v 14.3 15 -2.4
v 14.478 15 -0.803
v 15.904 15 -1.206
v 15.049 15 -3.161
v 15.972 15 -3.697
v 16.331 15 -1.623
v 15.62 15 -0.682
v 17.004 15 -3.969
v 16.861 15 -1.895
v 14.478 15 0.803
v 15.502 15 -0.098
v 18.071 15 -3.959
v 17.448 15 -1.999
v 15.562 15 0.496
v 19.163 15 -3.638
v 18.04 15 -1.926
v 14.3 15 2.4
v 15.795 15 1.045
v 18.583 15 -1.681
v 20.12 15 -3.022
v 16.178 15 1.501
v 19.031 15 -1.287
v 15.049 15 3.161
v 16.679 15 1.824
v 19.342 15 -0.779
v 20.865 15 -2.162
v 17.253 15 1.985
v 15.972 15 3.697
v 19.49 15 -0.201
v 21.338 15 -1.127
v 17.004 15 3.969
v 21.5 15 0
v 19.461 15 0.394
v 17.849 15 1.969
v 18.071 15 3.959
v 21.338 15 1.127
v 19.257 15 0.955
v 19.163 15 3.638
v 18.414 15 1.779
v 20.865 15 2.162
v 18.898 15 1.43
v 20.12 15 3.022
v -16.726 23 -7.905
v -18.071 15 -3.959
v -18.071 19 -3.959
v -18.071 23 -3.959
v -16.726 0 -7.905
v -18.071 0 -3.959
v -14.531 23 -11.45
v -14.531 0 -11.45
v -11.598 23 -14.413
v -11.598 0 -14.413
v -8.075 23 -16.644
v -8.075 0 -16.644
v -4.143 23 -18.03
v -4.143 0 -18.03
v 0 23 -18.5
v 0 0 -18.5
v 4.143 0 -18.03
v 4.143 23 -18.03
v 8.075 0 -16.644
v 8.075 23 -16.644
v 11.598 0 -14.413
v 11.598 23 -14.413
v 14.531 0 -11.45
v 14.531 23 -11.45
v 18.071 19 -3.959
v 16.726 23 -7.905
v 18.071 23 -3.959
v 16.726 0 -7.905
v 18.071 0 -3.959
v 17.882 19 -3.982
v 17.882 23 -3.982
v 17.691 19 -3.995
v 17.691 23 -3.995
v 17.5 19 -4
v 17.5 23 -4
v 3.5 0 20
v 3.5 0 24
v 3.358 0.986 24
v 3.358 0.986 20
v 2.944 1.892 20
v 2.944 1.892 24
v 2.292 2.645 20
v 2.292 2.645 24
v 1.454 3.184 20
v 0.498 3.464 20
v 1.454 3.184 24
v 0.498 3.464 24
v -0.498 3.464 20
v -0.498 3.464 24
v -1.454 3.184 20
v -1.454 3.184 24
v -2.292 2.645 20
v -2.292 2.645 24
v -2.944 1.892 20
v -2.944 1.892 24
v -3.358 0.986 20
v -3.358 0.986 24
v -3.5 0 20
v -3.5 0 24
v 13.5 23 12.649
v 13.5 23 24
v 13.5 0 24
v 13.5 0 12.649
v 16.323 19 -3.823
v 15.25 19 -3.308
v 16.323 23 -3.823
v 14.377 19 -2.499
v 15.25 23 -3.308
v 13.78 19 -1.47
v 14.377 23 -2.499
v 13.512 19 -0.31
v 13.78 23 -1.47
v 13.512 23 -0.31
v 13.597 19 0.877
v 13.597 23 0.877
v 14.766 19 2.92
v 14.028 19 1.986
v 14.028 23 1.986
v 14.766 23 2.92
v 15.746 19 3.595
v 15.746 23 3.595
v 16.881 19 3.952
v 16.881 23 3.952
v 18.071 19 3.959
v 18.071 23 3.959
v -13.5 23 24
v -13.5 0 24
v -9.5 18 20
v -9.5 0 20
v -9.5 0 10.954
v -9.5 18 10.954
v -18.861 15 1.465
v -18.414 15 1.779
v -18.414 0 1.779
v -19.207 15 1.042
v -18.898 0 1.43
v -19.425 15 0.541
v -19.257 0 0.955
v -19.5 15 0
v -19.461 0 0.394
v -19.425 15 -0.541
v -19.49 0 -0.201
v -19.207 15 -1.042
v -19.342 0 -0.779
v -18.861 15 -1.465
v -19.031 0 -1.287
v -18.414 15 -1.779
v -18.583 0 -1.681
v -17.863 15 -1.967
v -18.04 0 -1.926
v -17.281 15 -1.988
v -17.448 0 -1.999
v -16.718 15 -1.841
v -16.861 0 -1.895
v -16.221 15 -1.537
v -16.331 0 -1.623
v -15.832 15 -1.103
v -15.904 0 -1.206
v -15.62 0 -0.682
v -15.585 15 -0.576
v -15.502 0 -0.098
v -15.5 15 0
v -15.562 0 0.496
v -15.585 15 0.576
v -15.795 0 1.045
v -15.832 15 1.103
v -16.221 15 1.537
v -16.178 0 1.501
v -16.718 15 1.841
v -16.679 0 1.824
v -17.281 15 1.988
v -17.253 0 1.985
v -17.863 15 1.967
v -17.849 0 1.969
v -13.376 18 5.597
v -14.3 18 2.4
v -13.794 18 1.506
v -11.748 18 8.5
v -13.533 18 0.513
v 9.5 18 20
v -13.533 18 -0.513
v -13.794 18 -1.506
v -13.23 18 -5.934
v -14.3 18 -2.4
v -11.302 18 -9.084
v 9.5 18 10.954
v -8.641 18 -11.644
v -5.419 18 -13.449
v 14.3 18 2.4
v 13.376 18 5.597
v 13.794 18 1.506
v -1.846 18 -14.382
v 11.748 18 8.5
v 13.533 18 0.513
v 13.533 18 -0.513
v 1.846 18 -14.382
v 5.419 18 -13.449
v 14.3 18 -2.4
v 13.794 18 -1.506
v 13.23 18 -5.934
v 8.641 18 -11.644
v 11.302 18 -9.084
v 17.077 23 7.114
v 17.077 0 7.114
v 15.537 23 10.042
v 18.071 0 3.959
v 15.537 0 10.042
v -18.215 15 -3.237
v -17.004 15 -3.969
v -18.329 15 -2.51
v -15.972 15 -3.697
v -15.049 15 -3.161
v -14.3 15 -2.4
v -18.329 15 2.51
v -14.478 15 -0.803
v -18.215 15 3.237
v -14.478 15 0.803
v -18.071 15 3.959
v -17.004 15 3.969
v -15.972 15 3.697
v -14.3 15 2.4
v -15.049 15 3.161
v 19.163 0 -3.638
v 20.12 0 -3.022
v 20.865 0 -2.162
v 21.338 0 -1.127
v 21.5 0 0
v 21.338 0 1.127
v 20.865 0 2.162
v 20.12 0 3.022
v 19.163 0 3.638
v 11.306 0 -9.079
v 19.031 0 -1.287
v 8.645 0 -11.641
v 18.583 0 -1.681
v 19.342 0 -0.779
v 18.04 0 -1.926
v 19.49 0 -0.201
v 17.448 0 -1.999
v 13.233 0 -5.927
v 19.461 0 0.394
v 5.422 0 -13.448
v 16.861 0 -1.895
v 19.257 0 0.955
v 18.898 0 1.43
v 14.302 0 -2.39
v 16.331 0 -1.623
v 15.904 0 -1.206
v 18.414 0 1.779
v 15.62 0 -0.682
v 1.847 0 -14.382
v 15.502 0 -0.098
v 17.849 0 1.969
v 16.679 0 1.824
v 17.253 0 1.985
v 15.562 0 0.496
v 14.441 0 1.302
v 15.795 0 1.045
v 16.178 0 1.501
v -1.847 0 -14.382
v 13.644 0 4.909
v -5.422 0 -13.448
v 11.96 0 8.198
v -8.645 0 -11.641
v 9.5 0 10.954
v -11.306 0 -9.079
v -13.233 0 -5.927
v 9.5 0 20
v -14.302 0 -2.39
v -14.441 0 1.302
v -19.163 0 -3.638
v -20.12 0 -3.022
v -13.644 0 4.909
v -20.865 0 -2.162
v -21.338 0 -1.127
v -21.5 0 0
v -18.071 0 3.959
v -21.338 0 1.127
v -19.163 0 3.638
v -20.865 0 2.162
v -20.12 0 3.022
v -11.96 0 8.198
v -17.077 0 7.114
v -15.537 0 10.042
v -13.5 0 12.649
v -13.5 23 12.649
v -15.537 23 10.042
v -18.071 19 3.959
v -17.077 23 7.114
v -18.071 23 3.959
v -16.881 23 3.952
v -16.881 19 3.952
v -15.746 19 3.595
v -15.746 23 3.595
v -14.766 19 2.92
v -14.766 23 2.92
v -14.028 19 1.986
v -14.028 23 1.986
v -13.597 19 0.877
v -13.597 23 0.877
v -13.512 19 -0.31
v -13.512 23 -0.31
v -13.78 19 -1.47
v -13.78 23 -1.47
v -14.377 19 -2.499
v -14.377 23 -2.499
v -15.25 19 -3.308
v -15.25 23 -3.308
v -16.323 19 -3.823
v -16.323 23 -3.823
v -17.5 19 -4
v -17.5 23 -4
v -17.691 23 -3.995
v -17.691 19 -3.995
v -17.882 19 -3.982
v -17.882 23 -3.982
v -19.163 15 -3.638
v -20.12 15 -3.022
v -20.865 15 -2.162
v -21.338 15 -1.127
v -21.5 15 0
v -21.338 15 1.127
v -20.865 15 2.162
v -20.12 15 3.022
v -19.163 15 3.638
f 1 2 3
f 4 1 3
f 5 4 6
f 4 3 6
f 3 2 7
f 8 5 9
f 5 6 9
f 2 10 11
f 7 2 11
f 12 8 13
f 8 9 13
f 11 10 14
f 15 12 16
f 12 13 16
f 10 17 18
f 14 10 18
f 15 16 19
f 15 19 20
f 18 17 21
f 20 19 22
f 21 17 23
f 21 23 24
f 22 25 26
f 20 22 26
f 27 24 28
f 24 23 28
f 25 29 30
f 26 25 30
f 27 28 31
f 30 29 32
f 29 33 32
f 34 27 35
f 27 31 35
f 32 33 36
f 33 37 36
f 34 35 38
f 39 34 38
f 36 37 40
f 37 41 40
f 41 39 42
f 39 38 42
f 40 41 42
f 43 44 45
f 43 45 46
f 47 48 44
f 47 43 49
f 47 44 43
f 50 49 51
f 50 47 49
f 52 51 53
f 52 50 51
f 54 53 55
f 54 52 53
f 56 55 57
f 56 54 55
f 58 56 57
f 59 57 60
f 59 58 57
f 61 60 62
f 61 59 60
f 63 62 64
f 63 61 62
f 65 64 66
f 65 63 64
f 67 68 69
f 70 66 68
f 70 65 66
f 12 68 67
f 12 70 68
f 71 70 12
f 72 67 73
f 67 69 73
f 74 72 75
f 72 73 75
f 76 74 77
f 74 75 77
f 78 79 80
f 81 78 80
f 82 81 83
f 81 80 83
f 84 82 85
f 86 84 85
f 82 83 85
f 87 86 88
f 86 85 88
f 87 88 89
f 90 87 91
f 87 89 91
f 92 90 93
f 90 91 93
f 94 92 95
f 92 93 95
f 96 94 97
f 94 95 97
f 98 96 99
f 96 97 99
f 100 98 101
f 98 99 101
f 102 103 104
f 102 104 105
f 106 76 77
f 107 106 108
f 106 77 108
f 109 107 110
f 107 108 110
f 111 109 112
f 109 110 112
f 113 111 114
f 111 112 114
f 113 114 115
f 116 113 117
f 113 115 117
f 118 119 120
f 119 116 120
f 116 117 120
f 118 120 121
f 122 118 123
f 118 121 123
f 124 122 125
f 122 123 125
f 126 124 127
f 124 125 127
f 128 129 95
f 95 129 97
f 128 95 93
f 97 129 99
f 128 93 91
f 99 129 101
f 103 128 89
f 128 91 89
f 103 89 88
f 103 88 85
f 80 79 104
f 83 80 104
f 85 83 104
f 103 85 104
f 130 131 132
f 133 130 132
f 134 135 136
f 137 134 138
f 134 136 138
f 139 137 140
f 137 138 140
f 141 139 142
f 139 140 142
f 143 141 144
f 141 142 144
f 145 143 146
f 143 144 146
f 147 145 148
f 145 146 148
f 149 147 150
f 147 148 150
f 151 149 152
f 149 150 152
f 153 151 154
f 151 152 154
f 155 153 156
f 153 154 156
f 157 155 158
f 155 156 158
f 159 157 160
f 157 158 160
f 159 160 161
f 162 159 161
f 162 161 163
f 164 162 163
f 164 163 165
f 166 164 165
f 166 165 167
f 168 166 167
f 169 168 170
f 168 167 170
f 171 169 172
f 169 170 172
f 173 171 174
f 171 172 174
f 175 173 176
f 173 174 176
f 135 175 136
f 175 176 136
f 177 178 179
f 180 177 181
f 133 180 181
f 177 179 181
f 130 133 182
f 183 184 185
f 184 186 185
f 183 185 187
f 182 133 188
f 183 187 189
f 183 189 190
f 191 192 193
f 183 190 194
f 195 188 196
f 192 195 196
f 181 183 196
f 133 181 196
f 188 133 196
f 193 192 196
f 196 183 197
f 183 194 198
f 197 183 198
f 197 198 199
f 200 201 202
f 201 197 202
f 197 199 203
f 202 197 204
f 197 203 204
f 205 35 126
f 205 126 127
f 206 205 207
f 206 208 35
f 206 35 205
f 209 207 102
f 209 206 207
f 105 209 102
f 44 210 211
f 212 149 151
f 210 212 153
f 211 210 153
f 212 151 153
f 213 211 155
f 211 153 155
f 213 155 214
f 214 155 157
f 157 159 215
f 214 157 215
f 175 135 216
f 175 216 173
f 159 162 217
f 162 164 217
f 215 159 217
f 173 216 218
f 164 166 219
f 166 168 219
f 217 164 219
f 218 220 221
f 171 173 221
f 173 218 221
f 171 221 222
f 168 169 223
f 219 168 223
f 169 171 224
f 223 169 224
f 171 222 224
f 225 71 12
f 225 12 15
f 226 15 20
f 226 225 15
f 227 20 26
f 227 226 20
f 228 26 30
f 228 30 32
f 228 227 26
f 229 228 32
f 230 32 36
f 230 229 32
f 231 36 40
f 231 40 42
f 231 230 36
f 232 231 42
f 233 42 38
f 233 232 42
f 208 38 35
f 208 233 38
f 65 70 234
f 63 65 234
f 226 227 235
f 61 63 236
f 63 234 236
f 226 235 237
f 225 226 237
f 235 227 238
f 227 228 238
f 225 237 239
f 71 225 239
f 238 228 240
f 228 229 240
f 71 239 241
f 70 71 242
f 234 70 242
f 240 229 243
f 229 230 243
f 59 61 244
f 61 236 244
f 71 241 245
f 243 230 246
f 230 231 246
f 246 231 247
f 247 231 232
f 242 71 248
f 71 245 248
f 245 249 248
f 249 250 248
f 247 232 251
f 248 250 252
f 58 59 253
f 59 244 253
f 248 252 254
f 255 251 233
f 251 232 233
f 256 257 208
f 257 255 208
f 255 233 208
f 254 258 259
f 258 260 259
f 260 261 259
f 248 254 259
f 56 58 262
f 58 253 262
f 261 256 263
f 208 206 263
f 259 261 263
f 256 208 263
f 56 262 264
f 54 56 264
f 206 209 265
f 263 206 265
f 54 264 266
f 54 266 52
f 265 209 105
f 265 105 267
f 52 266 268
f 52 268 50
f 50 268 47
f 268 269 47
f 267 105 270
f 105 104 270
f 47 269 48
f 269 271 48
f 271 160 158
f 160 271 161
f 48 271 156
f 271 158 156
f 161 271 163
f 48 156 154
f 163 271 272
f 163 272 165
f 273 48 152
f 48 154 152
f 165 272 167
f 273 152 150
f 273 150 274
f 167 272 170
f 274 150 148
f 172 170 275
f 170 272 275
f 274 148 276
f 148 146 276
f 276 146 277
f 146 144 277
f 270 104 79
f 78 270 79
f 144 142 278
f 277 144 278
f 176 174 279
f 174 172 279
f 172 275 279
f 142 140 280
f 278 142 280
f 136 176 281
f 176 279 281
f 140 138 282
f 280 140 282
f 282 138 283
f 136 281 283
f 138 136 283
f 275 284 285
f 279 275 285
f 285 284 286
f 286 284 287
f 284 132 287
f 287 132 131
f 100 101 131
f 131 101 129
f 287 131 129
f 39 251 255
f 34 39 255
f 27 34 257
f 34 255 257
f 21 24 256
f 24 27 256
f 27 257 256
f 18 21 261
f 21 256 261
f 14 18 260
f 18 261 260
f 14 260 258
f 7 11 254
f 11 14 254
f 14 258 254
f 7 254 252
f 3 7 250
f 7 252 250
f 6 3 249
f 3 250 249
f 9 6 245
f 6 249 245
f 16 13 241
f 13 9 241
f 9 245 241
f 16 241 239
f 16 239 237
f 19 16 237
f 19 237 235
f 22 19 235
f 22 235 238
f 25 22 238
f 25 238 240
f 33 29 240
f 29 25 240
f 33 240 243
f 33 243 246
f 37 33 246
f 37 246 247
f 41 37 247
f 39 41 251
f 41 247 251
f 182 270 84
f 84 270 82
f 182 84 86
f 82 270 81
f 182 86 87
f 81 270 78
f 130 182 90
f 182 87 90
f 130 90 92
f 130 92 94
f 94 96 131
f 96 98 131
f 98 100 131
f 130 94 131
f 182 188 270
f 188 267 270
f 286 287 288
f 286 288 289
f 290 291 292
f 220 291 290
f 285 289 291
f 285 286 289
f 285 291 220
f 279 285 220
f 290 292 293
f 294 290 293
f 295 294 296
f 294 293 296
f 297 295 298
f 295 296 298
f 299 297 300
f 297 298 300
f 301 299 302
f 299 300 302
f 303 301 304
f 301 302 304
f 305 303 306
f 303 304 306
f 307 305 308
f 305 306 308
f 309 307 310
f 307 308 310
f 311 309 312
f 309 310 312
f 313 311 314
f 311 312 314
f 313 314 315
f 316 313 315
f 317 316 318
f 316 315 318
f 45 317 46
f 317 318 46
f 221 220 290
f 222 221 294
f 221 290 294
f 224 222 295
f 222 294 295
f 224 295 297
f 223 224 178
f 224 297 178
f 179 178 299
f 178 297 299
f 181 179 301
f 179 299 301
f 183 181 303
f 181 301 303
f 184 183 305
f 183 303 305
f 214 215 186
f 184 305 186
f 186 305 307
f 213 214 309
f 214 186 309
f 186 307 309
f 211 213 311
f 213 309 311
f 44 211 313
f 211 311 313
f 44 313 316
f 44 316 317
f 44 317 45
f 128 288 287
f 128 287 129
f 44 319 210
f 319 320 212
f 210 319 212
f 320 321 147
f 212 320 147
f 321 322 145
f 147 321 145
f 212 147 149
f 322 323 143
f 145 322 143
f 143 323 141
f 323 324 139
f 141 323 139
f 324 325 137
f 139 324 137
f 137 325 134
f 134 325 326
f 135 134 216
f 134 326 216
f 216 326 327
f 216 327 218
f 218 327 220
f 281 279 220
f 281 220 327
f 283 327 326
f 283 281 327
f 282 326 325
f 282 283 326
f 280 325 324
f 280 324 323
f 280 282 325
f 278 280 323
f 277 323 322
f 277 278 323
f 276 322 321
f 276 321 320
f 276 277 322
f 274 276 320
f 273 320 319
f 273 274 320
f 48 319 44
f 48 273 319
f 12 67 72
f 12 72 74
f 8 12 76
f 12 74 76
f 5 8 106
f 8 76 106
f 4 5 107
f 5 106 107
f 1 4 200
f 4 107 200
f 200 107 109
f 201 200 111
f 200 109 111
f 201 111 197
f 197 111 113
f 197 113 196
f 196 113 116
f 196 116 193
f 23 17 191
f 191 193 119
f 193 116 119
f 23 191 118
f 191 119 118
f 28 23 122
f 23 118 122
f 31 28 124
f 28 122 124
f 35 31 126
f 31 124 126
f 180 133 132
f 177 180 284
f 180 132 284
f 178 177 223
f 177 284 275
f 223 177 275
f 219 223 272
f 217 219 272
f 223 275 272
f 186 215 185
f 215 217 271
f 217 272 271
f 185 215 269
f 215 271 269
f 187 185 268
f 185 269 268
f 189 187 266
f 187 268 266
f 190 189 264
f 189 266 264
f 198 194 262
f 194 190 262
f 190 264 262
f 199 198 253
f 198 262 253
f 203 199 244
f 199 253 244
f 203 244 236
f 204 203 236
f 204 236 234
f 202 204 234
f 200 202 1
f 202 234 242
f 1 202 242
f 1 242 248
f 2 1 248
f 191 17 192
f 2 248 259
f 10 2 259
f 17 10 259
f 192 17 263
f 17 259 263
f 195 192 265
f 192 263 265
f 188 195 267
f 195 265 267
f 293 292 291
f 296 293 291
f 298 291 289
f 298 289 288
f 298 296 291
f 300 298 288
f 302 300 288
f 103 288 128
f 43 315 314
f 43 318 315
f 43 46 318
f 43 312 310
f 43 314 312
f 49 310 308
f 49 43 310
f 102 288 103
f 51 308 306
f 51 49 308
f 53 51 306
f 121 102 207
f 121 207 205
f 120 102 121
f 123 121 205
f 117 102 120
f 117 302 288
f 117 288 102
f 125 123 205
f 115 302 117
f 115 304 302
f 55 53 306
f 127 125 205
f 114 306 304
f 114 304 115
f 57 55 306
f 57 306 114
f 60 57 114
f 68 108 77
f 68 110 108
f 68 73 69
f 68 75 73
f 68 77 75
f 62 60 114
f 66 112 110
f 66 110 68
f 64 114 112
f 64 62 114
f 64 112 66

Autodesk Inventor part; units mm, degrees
ref_plane "YZ Plane" through (0, 0, 0) normal (1, 0, 0) x (0, 1, 0)
ref_plane "XZ Plane" through (0, 0, 0) normal (0, 1, 0) x (-1, 0, 0)
ref_plane "XY Plane" through (0, 0, 0) normal (0, 0, 1) x (1, 0, 0)
sketch "Sketch1" plane through (0, 0, 0) normal (0, 1, 0) x (-1, 0, 0)
  arc A0 (-9.5, 10.9545) -> (9.5, 10.9545) centre (0, 0) ccw
  line L0 (-9.5, 10.9545) -> (-9.5, 20)
  line L1 (-9.5, 20) -> (9.5, 20)
  line L2 (9.5, 20) -> (9.5, 10.9545)
  line L3 (13.5, 12.6491) -> (13.5, 24)
  line L4 (13.5, 24) -> (-13.5, 24)
  line L5 (-13.5, 24) -> (-13.5, 12.6491)
  arc A1 (-13.5, 12.6491) -> (13.5, 12.6491) centre (0, 0) ccw
  point P0 (0, -20)
  point P1 (-9.5, 15)
  dimension "d0" = 0
  dimension "d1" = 29
  dimension "d6" = 20
  dimension "d7" = 19
  dimension "d8" = 4
extrude "Extrusion1" add sketch "Sketch1" along normal blind 18
sketch "Sketch2" plane through (0, 18, 0) normal (0, 1, 0) x (1, 0, 0)
  arc A0 (13.5, -12.6491) -> (-13.5, -12.6491) centre (0, 0) ccw
  line L0 (-13.5, -12.6491) -> (-13.5, -24) projected
  line L1 (-13.5, -24) -> (13.5, -24)
  line L2 (13.5, -24) -> (13.5, -12.6491)
  line L3 (-13.5, -12.6491) -> (-13.5, -24)
extrude "Extrusion2" add sketch "Sketch2" along normal blind 5
sketch "Sketch3" plane through (-13.5, 0, 24) normal (0, 0, 1) x (1, 0, 0)
  circle A0 centre (13.5, 0) radius 3.5
  dimension "d13" = 7
extrude "Extrusion3" cut sketch "Sketch3" against normal blind 5
sketch "Sketch7" plane through (0, 0, 0) normal (0, -1, 0) x (1, 0, 0)
  circle A0 centre (-17.5, 0) radius 2
  circle A1 centre (17.5, 0) radius 2
  arc A2 (-18.0714, 3.959) -> (-18.0714, -3.959) centre (-17.5, 0) ccw
  arc A3 (18.0714, -3.959) -> (18.0714, 3.959) centre (17.5, 0) ccw
  arc A4 (-13.5, 12.6491) -> (13.5, 12.6491) centre (0, 0) ccw projected
  point P0 (18.4143, 1.7788)
  point P1 (18.4143, -1.7788)
  point P2 (-18.4143, -1.7788)
  point P3 (-18.4143, 1.7788)
  dimension "d29" = 4
  dimension "d30" = 4
  dimension "d31" = 35
  dimension "d32" = 17.5
  dimension "d33" = 8
  dimension "d34" = 8
extrude "Extrusion6" add sketch "Sketch7" against normal blind 15 contours A0 A4 A2 | A1 A4 A3
extrude "Extrusion7" cut sketch "Sketch7" against normal blind 15 contours A0 A4 | A4 A1 picked at (-17.4936, 0) picked at (17.4985, 0.08)
sketch "Sketch8" plane through (0, 0, 0) normal (0, 0, 1) x (1, 0, 0)
  line L0 (17.5, 15) -> (21.5, 15)
  line L1 (21.5, 15) -> (21.5, 19)
  line L2 (21.5, 19) -> (17.5, 19)
  line L3 (17.5, 19) -> (17.5, 15)
  line L4 (18.0714, 0) -> (-18.0714, 0) projected
  line L5 (21.5, 15) -> (18.0714, 15) projected
  point P0 (0, 0)
  point P1 (0, 0)
  dimension "d39" = 17.5
  dimension "d40" = 0
  dimension "d41" = 4
  dimension "d42" = 4
revolve "Revolution1" cut sketch "Sketch8" angle 360 about axis through (17.5, 19, 0) along (0, -1, 0)
sketch "Sketch9" plane through (17.5, 19, 0) normal (0, -1, 0) x (1, 0, 0)
  arc A0 (0.5714, 3.959) -> (0.5714, -3.959) centre (0, 0) ccw projected
  point P0 (-17.5, 0)
hole "Hole1" at (17.5, 19, 0) direction (0, 1, 0) diameter 8 end through all
mirror "Mirror1" about plane through (0, 0, 0) normal (1, 0, 0) of "Revolution1"
sketch "Sketch10" plane through (-17.5, 19, 0) normal (0, -1, 0) x (1, 0, 0)
  arc A0 (3.2, -2.4) -> (3.2, 2.4) centre (0, 0) ccw projected
  point P0 (17.5, 0)
hole "Hole2" at (-17.5, 19, 0) direction (0, 1, 0) diameter 8 end through all
properties part number "motor_holder_v2"
